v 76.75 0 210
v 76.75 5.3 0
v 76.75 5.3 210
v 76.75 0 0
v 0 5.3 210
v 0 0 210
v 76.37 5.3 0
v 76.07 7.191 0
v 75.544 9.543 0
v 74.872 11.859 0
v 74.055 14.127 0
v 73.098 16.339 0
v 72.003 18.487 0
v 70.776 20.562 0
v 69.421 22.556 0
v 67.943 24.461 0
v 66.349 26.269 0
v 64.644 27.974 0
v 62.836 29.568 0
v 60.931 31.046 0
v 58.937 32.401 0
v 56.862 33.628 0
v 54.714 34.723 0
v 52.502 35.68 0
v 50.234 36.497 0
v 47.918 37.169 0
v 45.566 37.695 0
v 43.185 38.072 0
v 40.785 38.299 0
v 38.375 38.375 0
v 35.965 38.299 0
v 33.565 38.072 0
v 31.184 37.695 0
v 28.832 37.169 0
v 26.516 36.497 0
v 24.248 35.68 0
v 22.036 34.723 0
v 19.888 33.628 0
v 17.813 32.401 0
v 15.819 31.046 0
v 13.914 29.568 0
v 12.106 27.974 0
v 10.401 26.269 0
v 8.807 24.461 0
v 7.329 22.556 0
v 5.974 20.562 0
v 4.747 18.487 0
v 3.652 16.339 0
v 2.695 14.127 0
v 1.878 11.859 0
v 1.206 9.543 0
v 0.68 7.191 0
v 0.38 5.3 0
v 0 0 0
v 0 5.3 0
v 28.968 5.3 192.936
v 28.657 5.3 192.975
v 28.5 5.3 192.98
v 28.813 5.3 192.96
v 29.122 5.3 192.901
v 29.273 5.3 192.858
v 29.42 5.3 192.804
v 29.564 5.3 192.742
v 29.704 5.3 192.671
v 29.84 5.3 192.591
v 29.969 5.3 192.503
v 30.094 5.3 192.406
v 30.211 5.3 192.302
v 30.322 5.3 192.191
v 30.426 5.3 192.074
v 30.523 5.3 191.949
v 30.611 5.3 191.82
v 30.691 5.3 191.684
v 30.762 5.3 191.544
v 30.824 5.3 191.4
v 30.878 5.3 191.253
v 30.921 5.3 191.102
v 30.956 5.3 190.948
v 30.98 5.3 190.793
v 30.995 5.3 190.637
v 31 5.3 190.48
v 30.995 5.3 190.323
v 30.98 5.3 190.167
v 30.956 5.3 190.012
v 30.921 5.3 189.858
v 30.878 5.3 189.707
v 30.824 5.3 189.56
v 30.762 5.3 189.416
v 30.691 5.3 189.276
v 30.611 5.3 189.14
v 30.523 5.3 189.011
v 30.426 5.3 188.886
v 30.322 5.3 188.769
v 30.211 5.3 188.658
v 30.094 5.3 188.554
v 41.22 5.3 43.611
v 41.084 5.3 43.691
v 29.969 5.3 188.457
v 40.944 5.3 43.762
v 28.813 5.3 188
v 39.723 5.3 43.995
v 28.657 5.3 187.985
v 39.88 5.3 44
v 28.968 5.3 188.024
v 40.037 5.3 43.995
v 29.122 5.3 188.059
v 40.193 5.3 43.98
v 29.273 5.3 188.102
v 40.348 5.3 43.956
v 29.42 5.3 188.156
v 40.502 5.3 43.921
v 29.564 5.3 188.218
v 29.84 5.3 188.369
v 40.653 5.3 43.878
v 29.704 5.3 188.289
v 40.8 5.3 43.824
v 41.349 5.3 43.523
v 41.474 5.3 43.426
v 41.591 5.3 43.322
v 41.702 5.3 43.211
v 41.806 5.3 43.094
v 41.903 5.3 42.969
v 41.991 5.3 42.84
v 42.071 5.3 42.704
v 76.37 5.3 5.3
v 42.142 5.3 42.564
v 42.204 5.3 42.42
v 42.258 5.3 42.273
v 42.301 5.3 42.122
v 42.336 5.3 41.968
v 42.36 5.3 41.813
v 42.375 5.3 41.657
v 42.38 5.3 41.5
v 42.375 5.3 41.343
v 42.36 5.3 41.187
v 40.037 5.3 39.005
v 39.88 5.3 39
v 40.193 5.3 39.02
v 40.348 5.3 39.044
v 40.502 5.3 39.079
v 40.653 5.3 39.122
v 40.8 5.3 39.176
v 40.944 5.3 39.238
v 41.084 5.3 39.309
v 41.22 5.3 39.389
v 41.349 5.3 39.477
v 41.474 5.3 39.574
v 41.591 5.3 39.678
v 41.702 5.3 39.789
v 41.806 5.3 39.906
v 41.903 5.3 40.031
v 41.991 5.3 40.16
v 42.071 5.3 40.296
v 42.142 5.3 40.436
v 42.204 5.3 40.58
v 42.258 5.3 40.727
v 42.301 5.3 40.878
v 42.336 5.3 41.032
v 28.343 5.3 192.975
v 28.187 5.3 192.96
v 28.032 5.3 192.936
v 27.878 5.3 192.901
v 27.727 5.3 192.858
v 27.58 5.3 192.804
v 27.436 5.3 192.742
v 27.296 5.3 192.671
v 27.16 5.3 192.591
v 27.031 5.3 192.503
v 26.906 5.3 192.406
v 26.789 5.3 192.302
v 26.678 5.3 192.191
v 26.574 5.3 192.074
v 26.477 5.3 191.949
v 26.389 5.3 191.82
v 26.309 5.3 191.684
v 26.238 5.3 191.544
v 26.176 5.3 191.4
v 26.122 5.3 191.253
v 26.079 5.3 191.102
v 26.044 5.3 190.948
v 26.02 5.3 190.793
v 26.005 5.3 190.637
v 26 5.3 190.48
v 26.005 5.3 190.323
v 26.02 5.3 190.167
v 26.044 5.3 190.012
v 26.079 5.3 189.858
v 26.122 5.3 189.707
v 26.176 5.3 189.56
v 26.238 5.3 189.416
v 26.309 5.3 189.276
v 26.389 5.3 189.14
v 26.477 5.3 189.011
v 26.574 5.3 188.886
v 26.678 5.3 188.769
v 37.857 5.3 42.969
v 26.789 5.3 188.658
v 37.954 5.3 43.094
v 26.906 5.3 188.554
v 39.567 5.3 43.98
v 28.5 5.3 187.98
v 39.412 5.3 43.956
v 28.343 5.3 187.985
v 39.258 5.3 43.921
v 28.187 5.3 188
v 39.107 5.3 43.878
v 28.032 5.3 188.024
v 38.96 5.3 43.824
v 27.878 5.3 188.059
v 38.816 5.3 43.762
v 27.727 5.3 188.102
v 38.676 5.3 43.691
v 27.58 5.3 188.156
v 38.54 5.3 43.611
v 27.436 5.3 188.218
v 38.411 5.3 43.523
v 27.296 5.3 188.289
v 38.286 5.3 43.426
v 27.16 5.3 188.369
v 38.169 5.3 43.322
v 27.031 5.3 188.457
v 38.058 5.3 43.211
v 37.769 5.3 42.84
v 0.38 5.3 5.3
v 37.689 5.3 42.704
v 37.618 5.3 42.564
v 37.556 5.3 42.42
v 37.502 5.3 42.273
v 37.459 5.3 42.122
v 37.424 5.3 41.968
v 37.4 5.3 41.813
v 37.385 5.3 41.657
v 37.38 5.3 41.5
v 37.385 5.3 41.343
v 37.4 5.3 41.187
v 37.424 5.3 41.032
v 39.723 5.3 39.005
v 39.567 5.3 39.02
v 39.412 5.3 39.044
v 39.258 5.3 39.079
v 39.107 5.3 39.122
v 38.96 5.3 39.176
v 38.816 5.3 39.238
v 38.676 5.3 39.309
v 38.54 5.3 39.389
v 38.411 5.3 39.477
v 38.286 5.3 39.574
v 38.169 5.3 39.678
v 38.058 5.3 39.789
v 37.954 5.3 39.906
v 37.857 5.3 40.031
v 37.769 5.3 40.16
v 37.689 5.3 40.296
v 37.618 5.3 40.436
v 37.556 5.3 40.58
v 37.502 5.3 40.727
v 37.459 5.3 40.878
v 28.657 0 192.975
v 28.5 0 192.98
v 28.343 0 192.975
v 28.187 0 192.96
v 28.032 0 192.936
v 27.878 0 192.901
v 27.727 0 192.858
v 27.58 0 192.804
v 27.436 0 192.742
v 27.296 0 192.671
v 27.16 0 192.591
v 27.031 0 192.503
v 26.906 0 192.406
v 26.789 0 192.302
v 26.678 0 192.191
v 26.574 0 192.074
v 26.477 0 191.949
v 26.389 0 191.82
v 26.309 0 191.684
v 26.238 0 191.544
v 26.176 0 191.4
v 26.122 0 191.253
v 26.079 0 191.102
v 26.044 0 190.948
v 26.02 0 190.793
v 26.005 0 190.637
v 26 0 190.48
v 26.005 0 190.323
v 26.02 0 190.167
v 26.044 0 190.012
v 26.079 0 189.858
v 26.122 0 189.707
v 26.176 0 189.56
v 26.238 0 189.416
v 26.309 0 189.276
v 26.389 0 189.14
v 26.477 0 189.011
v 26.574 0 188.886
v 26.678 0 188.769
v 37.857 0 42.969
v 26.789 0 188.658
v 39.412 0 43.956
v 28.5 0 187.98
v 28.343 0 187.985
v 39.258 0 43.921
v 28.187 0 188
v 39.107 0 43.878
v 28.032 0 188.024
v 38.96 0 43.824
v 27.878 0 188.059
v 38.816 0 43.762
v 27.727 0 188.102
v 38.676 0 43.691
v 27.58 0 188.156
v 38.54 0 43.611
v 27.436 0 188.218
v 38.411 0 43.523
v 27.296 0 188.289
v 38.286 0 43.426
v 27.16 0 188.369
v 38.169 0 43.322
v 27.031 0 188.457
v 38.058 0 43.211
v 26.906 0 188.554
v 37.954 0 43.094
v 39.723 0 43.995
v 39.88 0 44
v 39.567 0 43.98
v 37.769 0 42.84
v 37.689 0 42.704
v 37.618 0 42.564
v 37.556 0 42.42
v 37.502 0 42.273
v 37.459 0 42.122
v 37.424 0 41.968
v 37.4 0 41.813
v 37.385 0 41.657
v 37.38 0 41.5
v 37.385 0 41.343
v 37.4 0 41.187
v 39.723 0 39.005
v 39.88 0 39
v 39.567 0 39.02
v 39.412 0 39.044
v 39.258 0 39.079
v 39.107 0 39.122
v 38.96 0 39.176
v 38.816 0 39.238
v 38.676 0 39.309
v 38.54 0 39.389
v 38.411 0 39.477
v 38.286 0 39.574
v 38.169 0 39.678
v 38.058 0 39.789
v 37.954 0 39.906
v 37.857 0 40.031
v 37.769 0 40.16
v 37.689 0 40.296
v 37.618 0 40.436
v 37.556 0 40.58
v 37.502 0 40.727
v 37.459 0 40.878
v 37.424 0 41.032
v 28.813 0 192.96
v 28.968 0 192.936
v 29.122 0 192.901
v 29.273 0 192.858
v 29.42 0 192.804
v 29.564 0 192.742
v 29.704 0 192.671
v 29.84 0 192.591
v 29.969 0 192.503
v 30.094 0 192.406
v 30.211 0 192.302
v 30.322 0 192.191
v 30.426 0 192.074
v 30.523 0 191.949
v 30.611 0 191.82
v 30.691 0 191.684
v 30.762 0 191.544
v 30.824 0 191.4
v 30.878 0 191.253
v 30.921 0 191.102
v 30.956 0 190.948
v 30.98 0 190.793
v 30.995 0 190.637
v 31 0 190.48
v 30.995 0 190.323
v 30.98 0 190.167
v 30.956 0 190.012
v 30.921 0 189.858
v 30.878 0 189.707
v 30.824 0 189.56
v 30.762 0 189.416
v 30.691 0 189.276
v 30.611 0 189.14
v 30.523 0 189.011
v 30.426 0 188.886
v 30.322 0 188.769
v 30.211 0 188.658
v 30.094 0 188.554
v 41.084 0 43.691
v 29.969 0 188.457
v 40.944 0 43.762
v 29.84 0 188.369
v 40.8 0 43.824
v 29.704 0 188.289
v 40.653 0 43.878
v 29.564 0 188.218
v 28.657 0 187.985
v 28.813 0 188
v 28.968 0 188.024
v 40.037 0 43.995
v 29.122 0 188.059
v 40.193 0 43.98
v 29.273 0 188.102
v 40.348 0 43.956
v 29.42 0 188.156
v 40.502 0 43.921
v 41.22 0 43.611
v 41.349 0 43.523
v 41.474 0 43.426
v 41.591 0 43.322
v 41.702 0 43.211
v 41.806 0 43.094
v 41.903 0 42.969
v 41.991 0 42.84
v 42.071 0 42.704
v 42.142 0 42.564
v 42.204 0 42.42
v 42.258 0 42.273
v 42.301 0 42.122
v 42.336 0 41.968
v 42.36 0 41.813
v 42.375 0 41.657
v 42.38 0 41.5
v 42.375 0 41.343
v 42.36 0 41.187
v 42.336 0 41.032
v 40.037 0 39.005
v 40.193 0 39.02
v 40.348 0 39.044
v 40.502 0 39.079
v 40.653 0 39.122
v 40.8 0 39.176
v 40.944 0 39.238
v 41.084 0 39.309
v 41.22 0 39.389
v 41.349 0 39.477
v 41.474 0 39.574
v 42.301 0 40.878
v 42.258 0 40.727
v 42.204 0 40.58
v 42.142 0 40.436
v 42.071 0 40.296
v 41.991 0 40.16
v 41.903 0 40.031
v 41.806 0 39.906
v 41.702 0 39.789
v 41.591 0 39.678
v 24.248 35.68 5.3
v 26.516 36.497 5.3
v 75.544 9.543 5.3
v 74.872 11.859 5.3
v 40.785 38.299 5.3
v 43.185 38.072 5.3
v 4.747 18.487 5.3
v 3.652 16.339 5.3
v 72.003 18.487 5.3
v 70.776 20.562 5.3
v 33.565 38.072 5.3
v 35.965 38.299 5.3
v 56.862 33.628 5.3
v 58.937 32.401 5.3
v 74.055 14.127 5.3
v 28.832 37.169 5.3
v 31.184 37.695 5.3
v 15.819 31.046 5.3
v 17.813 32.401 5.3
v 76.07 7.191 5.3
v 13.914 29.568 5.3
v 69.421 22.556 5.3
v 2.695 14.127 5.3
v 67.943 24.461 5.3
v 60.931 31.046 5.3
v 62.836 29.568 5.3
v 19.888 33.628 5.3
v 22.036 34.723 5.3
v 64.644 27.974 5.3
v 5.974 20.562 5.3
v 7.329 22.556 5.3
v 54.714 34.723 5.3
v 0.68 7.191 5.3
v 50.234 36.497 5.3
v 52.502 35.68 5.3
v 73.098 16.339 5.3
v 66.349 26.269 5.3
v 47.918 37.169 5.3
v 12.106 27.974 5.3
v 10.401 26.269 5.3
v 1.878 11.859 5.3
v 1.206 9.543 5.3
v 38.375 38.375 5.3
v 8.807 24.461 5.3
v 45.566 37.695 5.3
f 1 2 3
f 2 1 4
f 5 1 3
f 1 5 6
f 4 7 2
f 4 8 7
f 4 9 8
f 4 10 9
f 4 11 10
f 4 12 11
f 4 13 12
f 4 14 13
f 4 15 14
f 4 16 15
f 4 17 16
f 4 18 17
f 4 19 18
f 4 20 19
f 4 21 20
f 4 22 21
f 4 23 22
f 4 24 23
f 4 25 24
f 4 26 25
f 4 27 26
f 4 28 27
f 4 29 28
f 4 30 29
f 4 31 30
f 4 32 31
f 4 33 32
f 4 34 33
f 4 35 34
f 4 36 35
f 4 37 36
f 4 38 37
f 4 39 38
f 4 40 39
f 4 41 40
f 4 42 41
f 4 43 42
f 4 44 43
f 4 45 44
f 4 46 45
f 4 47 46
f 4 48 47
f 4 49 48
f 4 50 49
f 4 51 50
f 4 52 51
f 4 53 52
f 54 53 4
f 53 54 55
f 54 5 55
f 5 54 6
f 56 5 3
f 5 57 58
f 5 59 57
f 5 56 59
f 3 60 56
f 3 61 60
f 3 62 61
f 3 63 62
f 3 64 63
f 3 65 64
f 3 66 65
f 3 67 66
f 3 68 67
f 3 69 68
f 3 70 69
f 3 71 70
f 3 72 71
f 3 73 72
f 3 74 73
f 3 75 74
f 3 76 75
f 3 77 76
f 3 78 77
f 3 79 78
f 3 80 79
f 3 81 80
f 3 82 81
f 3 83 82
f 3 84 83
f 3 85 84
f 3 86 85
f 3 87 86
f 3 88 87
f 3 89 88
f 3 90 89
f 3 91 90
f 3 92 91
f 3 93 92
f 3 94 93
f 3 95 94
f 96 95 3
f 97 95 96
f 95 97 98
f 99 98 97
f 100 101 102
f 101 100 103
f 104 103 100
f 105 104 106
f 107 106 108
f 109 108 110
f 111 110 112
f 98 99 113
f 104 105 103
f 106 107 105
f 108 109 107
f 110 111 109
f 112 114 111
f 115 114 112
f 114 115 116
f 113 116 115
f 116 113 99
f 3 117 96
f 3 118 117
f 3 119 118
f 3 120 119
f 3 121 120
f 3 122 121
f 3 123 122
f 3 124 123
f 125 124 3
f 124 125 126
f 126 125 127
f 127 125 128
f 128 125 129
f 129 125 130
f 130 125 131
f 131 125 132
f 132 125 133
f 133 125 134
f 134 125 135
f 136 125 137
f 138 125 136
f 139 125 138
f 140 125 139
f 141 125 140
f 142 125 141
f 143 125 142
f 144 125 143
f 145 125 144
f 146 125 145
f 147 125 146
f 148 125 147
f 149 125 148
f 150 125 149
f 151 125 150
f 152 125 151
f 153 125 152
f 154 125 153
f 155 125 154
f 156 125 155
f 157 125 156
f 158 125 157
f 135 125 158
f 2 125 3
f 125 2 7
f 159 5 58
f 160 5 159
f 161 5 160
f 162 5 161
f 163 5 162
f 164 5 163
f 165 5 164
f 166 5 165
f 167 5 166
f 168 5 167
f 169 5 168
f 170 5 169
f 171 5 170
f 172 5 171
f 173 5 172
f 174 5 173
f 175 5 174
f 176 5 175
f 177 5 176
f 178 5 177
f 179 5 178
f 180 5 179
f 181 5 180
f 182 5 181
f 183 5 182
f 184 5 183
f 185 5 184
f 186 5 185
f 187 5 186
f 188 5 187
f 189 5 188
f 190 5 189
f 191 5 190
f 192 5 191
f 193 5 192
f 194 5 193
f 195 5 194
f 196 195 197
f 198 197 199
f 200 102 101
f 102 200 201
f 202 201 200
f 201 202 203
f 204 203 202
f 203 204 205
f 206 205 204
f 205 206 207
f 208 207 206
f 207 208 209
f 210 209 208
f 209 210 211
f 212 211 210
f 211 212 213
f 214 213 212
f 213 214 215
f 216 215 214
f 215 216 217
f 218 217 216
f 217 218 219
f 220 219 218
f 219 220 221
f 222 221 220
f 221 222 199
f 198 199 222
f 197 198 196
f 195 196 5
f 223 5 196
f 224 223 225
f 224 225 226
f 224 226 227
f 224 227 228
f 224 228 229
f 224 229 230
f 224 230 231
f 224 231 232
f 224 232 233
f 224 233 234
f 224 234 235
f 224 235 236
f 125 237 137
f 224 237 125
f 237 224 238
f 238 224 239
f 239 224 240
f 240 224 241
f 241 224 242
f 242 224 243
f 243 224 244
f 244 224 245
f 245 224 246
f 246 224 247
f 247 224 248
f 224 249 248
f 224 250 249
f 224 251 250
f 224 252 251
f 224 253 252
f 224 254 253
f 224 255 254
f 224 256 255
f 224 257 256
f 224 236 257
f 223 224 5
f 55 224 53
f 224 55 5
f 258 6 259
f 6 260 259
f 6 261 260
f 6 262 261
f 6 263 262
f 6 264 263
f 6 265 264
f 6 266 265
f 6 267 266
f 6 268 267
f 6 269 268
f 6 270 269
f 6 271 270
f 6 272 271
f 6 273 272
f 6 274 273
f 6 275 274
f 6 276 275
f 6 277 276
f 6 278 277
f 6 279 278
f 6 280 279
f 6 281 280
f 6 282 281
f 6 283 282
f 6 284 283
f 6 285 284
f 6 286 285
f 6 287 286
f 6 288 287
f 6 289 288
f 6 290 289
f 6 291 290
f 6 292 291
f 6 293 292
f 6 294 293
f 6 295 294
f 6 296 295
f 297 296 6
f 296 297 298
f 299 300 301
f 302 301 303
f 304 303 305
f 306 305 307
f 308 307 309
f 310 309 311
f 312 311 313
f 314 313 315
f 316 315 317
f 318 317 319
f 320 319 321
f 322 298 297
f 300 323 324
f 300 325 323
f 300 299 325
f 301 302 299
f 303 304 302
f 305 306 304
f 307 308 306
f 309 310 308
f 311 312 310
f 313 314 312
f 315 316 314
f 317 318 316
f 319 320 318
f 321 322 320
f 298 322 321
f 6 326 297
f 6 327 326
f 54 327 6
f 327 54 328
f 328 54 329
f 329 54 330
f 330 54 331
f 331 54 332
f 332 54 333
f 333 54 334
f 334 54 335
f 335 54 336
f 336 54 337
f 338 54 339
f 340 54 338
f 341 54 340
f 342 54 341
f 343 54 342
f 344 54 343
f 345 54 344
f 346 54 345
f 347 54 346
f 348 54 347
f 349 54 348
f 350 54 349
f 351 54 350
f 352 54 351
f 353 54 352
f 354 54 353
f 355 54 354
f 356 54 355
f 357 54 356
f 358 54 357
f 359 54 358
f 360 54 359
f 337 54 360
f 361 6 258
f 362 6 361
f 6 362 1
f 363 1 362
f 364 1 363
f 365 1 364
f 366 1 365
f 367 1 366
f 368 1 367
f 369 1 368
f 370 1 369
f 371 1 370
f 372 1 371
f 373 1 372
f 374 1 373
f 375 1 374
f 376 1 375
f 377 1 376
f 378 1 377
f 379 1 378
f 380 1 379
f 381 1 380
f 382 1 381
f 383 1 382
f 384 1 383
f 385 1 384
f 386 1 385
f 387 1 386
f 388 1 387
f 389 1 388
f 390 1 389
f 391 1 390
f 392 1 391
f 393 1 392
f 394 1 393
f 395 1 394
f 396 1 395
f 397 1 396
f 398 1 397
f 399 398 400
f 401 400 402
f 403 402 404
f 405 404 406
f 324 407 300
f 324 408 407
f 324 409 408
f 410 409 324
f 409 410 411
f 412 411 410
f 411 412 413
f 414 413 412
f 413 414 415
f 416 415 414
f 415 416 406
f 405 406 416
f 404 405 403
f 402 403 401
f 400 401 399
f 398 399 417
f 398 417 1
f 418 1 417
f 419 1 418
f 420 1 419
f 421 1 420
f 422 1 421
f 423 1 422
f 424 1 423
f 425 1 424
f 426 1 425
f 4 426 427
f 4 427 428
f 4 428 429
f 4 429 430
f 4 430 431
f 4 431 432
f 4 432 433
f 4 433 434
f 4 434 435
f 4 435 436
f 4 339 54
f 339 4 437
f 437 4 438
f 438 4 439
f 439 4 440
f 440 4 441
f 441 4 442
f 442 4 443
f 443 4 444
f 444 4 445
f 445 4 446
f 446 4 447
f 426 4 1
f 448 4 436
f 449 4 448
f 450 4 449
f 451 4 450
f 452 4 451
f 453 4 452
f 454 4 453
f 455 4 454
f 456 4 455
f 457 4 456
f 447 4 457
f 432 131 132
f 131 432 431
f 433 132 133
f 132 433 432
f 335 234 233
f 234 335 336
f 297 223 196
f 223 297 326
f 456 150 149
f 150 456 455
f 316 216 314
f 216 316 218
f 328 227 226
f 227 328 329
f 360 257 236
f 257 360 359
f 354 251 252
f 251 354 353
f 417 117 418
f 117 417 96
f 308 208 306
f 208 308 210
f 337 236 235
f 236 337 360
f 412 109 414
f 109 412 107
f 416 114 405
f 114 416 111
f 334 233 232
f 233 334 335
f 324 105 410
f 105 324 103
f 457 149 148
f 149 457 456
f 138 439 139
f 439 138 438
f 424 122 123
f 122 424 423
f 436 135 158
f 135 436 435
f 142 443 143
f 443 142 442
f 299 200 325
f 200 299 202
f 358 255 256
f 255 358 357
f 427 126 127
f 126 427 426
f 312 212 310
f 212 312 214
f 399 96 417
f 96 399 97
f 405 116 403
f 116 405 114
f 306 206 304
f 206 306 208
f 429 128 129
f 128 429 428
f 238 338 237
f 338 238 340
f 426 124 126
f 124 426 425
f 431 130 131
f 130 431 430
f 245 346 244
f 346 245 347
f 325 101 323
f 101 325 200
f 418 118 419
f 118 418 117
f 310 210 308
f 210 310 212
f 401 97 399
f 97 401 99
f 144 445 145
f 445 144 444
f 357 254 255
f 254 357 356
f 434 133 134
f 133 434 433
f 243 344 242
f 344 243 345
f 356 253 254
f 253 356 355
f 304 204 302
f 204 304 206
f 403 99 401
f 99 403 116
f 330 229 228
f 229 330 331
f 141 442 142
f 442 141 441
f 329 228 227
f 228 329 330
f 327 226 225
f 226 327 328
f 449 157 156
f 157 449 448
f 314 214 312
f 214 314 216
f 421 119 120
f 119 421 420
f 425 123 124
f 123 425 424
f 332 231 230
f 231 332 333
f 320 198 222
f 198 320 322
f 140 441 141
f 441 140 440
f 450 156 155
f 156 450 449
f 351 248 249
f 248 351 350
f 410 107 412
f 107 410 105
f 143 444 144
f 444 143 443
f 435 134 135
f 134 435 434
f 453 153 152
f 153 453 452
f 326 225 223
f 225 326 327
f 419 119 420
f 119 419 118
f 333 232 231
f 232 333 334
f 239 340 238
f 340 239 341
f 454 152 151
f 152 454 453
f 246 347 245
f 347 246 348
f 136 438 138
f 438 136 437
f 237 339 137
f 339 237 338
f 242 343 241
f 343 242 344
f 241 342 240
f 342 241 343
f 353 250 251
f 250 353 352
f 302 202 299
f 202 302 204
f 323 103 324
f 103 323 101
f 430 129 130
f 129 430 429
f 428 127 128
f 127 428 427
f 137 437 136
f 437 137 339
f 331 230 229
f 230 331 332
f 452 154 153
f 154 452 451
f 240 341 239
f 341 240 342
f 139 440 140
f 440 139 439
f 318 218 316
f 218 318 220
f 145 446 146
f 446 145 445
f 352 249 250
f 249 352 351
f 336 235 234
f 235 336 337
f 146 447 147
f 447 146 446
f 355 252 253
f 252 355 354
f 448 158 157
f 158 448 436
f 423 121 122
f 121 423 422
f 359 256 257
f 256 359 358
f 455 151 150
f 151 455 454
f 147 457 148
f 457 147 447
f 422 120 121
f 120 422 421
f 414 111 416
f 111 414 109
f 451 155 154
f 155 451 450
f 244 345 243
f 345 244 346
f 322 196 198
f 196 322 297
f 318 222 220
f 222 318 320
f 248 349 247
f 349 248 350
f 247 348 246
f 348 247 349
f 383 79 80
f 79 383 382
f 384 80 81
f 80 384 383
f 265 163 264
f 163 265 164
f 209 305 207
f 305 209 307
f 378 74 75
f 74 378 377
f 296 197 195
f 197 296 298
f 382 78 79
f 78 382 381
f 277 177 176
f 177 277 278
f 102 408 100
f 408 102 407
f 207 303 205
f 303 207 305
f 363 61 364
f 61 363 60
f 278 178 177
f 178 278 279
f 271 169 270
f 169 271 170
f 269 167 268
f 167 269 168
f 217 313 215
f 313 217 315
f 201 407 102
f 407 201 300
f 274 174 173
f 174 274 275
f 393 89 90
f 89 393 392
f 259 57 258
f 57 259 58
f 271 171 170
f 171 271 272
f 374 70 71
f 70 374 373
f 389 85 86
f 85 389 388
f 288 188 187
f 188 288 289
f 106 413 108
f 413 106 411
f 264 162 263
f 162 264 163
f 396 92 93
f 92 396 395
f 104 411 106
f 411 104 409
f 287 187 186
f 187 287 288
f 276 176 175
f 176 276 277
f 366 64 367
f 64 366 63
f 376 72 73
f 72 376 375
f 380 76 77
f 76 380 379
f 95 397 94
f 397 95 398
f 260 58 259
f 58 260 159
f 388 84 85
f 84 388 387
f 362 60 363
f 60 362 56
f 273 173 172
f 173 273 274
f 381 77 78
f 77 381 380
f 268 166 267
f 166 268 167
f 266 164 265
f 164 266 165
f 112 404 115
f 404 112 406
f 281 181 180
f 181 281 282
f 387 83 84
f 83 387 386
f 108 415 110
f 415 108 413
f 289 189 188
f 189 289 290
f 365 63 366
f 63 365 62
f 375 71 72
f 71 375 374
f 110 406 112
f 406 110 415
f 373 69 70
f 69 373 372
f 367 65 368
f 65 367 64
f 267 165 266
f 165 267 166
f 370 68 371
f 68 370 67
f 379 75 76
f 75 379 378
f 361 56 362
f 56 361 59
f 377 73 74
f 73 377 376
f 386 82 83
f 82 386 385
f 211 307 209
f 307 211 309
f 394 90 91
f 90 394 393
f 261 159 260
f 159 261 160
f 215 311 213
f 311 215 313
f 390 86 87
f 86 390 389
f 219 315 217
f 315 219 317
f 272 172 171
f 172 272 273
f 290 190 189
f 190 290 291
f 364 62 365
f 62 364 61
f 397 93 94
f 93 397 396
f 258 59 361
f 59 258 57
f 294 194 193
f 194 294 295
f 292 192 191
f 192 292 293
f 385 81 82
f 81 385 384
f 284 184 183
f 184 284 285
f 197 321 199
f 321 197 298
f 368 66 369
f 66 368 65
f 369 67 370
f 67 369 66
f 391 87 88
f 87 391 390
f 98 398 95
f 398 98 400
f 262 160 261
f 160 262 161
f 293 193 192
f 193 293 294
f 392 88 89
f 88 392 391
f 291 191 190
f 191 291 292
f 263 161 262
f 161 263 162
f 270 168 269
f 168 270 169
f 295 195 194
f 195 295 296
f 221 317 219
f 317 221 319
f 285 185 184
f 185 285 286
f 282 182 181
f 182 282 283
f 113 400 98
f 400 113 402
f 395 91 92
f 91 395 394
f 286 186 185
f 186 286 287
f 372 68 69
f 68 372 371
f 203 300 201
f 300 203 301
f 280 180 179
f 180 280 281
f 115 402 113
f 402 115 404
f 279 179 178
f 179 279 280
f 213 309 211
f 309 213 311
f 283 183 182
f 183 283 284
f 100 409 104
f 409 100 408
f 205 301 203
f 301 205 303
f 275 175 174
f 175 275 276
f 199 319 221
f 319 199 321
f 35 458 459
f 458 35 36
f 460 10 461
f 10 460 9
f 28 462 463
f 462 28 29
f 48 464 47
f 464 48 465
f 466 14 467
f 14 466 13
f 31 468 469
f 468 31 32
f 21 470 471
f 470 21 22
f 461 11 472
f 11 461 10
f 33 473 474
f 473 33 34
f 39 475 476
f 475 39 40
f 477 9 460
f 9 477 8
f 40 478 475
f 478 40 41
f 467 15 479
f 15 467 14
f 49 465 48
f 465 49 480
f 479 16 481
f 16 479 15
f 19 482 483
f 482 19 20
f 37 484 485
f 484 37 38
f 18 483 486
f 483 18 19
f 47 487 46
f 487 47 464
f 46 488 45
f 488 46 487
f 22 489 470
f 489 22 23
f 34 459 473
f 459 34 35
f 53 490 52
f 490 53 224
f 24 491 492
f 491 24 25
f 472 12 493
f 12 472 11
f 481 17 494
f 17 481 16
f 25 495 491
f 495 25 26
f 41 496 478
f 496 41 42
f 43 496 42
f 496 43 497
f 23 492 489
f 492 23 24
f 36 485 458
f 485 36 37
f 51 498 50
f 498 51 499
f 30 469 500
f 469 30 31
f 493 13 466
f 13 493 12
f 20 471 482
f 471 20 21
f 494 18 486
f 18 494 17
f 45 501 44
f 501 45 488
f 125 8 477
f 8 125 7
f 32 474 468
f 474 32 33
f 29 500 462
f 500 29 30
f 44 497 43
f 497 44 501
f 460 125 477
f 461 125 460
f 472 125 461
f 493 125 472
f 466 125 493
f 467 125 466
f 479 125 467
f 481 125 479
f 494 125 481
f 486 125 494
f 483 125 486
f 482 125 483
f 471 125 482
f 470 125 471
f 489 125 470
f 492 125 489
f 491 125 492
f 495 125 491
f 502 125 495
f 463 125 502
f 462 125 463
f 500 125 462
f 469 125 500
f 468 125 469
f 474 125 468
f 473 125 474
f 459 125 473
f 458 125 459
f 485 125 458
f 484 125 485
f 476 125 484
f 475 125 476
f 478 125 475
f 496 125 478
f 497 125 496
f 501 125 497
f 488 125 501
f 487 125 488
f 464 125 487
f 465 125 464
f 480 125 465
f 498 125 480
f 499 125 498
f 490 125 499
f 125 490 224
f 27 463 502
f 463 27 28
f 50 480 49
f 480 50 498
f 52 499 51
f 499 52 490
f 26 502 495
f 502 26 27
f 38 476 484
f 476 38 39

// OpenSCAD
$fn =100;
d = 5.3; // plate depth
w = 76.75;
u = w/2;

difference(){
cube([w,d,210]);
translate([39.88,d,41.5]){
rotate([90,0,0])
    cylinder(h = d+2, r1 = 2.5, r2 = 2.5, $fn = 100);
}
translate([28.5,d,190.48]){
rotate([90,0,0])
    cylinder(h = d+2, r1 = 2.5, r2 = 2.5, $fn = 100);
}
}
//
difference(){

translate([w/2,0,0]){
cylinder(h = d, r1 = w/2, r2 = w/2, $fn = 100);
}

translate([0,-u,0])
cube([w,u,d+1]);
}
